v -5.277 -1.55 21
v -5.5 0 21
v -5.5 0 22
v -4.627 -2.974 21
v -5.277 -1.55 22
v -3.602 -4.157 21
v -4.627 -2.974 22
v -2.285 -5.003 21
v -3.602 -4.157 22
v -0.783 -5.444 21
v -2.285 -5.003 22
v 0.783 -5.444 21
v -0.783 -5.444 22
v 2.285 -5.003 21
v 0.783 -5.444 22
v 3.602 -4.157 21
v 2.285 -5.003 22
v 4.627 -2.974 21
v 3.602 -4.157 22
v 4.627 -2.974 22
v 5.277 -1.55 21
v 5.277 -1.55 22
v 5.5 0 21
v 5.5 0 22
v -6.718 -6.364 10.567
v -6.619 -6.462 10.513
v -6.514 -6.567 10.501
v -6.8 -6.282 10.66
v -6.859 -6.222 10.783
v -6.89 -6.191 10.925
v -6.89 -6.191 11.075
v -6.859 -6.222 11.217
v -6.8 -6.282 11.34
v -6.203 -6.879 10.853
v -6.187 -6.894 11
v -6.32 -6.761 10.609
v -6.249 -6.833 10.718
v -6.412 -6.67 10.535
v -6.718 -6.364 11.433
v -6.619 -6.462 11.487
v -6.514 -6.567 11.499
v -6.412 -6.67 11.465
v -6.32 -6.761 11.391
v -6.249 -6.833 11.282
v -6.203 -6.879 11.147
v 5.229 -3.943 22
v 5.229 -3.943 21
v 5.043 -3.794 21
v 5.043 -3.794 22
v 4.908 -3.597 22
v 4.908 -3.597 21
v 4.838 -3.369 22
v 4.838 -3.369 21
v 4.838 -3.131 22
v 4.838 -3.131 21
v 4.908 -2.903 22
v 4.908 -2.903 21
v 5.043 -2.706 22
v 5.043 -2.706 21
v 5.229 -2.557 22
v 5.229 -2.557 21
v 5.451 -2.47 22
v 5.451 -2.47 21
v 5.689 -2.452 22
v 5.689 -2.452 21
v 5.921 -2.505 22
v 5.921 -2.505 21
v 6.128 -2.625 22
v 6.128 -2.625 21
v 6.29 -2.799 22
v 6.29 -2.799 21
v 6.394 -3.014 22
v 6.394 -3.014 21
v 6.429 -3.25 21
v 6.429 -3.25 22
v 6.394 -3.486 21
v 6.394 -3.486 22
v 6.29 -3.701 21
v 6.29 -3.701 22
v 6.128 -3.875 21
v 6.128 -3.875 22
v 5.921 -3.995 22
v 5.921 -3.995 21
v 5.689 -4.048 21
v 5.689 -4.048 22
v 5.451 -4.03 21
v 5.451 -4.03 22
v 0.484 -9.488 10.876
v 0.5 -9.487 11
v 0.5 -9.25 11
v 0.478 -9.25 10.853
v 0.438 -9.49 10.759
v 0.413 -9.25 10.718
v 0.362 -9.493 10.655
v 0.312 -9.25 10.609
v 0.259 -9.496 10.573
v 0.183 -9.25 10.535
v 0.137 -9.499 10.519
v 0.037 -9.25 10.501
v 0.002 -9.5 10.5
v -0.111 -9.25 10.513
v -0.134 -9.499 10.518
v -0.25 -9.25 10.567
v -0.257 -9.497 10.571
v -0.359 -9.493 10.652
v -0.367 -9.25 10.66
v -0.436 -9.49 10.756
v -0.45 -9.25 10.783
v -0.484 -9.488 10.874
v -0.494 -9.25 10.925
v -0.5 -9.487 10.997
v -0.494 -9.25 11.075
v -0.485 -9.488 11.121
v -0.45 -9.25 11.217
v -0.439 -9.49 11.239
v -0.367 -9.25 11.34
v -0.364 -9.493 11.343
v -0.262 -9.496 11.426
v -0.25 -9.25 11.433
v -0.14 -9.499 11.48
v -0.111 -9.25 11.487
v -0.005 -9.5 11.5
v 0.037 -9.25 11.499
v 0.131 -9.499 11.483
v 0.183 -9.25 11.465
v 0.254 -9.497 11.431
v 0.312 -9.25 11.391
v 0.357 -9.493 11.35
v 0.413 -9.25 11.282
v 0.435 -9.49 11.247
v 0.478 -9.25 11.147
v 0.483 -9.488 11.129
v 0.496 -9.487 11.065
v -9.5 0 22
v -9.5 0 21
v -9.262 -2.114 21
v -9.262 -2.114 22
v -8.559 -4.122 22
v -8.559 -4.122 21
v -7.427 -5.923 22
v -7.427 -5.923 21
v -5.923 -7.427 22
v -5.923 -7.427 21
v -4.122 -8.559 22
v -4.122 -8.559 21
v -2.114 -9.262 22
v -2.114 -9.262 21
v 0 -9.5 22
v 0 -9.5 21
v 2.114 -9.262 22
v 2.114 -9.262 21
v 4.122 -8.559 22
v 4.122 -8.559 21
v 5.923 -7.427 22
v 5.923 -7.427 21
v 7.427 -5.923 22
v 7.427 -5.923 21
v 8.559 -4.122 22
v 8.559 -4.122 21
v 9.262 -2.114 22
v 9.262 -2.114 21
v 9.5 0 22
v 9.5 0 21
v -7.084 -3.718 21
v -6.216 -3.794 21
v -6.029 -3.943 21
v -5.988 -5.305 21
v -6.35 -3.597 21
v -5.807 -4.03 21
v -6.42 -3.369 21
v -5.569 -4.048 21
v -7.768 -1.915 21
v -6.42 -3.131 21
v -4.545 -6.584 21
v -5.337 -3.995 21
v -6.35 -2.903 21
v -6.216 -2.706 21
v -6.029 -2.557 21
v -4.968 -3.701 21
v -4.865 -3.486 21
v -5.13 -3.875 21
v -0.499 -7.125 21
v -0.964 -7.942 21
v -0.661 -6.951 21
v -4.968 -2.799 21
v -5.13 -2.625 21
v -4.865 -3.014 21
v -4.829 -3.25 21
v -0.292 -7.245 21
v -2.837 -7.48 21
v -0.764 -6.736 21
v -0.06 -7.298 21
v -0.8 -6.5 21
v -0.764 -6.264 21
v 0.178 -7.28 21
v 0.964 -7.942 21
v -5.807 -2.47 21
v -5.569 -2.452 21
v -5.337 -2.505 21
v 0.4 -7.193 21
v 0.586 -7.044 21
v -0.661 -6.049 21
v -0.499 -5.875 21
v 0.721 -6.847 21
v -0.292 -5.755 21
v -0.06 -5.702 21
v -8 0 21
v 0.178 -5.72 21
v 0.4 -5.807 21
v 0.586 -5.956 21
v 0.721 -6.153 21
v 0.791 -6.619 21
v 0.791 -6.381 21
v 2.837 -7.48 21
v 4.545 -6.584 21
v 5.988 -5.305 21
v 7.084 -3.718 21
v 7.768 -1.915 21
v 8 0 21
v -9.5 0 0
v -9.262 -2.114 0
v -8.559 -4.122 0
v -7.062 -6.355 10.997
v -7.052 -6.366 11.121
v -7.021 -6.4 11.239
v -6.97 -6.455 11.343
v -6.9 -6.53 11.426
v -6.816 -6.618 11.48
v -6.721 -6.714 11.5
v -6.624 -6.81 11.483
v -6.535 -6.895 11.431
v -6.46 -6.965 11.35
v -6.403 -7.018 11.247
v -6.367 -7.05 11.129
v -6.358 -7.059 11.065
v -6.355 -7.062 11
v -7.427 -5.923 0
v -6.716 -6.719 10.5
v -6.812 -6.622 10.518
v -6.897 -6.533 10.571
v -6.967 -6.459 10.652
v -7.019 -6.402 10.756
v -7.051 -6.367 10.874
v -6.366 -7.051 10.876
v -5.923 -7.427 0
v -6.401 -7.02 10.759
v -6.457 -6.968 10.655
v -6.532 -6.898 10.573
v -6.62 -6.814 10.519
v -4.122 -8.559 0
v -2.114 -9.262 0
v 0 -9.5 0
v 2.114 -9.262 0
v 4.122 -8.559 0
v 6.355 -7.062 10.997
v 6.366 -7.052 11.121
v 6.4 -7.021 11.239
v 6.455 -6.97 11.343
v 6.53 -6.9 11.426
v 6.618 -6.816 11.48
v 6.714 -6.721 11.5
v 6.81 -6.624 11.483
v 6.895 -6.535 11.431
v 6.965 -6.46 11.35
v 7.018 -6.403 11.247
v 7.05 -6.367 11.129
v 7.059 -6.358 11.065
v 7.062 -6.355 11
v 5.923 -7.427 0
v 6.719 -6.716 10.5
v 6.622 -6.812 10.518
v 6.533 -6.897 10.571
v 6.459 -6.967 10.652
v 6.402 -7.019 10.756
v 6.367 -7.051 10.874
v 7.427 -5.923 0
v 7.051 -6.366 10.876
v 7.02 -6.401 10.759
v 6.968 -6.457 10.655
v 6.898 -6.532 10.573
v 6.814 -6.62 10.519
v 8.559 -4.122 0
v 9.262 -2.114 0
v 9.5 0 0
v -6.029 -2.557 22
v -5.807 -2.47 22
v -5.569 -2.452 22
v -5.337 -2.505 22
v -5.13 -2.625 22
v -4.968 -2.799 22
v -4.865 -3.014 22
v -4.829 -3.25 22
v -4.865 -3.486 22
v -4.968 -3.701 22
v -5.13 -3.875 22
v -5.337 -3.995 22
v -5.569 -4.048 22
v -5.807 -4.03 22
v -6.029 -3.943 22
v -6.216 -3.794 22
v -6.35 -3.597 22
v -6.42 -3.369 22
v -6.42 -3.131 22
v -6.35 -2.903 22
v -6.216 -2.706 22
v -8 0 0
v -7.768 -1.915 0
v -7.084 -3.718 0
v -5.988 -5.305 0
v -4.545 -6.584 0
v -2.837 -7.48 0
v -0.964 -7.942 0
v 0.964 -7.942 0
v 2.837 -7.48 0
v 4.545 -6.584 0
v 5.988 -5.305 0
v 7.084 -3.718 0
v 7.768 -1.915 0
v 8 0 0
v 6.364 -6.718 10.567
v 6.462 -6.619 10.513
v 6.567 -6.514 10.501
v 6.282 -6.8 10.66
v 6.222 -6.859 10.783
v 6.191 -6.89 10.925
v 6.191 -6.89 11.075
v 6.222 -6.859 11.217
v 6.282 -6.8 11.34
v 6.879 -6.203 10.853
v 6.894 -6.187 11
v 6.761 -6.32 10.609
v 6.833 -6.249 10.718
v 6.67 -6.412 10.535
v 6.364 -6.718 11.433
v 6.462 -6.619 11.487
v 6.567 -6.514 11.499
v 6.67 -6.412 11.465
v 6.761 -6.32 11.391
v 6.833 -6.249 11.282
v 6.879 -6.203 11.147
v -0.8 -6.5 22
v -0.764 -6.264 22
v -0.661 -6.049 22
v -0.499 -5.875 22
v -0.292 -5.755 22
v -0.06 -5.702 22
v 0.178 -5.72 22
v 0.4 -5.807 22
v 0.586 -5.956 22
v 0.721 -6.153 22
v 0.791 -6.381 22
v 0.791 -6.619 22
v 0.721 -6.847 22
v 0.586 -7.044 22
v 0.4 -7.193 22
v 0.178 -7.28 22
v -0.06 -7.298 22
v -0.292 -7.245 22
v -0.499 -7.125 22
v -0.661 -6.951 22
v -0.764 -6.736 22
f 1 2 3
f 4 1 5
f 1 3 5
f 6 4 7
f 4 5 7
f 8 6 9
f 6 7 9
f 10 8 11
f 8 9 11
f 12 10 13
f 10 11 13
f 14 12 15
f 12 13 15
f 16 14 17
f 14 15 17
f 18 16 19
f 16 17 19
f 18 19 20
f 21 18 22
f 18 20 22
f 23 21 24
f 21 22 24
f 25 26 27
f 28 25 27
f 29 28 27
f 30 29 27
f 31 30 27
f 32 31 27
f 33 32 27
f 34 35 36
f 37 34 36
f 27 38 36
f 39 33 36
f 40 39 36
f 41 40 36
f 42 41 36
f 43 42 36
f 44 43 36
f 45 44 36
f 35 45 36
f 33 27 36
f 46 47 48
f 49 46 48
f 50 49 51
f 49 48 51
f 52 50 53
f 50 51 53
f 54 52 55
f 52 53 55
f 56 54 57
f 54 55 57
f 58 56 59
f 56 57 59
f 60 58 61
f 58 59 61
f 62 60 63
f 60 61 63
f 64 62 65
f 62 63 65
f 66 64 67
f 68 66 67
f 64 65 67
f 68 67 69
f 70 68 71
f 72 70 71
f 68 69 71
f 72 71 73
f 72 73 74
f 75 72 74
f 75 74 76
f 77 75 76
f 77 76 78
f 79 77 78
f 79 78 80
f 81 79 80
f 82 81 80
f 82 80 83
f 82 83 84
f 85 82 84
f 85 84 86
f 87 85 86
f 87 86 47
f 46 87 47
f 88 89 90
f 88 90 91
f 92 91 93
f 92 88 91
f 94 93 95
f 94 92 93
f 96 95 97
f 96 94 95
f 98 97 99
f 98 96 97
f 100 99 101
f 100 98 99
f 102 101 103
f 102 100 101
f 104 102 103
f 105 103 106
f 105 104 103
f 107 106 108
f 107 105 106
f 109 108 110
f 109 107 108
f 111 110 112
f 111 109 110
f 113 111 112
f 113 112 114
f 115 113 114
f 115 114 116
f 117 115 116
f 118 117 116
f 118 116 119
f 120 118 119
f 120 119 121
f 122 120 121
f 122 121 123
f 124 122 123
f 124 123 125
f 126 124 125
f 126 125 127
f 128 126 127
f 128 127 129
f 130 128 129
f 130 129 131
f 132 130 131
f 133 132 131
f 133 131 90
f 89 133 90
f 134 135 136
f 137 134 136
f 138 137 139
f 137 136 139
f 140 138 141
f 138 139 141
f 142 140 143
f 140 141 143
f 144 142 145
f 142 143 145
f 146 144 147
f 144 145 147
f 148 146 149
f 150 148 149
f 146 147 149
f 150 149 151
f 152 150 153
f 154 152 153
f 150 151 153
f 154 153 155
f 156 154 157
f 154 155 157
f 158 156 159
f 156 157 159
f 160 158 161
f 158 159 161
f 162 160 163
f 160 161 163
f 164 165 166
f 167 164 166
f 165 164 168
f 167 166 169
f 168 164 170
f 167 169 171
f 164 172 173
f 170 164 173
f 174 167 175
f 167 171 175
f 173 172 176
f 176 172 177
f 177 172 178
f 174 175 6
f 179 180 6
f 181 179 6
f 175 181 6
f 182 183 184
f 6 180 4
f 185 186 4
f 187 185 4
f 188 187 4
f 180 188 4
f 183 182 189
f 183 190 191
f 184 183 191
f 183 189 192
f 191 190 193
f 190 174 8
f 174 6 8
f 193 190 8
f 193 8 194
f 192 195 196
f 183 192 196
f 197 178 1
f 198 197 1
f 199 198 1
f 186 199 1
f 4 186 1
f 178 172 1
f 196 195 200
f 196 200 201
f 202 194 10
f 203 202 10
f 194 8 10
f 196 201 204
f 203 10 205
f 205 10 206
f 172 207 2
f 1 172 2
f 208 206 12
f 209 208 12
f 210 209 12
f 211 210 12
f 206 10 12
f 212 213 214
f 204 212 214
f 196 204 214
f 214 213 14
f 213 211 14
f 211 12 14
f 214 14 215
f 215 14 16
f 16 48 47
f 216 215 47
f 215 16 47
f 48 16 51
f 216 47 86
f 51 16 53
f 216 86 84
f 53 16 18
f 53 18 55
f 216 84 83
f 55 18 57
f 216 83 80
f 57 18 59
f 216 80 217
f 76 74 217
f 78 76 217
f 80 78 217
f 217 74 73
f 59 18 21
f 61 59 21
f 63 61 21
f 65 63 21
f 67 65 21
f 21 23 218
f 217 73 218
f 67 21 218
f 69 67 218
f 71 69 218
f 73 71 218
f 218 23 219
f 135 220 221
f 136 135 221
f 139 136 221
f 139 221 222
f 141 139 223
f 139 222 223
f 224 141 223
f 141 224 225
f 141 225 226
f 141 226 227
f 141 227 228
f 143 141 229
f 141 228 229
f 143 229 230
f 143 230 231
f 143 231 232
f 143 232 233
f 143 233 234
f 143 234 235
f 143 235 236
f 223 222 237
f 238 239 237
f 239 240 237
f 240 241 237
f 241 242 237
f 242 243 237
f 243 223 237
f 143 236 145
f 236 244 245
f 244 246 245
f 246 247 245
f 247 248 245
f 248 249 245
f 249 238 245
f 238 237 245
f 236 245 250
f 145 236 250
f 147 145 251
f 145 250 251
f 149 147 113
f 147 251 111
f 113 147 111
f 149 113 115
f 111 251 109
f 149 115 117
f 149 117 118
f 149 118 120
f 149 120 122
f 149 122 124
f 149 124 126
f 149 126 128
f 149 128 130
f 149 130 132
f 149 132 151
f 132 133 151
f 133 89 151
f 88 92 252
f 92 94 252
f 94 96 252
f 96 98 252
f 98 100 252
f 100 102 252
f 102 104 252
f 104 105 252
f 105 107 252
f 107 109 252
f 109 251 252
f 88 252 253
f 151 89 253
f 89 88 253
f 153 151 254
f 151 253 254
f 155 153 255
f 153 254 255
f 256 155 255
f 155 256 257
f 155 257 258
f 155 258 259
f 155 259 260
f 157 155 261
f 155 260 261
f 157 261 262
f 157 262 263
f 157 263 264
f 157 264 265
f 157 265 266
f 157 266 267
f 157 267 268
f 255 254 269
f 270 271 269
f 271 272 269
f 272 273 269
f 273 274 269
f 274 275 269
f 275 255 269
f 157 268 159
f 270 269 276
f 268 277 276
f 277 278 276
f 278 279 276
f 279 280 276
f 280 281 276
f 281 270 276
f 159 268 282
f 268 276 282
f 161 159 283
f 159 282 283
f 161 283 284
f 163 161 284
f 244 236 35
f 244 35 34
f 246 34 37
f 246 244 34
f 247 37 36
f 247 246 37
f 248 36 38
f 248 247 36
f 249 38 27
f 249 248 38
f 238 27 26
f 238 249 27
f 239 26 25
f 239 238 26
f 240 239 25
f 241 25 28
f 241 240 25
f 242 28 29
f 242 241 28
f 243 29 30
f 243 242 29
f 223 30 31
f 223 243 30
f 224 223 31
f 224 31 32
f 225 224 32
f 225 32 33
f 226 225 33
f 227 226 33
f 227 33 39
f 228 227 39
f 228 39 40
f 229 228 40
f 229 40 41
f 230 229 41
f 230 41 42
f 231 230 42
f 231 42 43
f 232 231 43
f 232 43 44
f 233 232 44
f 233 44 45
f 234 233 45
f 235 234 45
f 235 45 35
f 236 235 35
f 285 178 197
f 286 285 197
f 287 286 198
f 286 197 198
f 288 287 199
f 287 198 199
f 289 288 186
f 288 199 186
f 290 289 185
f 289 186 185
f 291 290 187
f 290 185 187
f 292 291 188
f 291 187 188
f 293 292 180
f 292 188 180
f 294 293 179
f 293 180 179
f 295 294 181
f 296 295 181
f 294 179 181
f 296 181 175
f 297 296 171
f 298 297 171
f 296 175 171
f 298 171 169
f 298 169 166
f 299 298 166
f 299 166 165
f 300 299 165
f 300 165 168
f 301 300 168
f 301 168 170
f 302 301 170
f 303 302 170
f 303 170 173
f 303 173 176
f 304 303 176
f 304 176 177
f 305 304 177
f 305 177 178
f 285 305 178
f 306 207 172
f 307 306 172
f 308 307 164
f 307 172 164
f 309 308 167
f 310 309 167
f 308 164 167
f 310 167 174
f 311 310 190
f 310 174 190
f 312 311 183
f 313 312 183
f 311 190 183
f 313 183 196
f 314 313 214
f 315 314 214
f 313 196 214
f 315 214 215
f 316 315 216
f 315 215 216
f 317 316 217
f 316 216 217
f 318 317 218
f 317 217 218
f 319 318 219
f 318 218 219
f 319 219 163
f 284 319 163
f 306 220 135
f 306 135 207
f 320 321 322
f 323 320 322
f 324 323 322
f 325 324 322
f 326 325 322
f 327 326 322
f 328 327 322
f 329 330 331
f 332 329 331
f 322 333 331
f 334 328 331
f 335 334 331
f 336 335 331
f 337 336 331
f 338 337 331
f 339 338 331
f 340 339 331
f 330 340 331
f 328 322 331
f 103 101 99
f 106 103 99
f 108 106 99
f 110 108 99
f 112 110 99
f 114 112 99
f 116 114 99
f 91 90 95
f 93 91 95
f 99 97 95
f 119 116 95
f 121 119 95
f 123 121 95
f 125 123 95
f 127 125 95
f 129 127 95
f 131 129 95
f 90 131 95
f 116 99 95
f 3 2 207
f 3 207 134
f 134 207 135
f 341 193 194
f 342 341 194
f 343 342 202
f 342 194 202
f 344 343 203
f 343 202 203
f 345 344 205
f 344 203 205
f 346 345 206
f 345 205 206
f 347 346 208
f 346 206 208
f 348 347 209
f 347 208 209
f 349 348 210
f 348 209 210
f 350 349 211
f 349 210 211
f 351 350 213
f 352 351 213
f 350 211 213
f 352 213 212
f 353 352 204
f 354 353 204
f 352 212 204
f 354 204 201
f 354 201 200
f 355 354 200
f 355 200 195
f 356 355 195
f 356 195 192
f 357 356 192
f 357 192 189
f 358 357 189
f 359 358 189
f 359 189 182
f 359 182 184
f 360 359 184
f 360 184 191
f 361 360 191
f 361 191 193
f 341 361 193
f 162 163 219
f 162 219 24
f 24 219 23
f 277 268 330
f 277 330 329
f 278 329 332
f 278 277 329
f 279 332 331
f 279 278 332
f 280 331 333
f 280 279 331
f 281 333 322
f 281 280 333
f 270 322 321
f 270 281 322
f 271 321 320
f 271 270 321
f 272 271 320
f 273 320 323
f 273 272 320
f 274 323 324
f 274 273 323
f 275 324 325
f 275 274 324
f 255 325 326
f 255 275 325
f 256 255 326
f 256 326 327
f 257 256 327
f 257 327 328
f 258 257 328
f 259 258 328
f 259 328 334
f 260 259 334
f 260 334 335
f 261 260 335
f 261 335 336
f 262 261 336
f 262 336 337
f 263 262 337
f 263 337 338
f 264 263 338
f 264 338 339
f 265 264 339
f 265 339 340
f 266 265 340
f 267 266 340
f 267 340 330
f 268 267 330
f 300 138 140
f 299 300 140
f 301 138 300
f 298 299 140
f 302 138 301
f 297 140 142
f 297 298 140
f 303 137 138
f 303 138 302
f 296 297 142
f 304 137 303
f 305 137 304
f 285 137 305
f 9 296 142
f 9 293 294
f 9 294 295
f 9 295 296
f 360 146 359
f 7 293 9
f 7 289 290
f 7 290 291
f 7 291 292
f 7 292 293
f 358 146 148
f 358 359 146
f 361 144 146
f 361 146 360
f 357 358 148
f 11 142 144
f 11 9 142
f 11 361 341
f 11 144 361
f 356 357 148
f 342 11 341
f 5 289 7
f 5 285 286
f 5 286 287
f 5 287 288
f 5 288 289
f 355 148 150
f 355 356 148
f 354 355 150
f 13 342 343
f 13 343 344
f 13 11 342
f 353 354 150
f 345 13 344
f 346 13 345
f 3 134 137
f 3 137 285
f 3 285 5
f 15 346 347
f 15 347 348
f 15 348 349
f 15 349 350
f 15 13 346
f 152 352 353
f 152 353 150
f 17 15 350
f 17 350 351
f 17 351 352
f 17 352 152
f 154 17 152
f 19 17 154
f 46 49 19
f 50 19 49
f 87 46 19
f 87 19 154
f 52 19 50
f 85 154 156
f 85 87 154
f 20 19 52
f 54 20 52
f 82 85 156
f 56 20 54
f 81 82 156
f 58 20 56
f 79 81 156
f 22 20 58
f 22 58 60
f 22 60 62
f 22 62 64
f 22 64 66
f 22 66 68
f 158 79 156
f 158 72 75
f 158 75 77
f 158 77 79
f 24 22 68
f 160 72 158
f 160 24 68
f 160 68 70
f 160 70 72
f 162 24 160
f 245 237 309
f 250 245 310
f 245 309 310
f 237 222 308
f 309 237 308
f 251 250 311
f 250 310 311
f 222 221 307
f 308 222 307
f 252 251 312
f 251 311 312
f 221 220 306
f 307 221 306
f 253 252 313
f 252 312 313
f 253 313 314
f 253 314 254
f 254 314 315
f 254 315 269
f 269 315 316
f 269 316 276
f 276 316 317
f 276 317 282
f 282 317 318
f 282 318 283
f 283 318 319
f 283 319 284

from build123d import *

# Parameters (mm, degrees)
SKETCH1_R                       = 9.5
BOSS_EXTRUDE1_DEPTH             = 21
SKETCH2_R                       = 8
CUT_EXTRUDE1_DEPTH              = 22
SKETCH4_W                       = 19
SKETCH4_H                       = 9.5
CUT_EXTRUDE2_DEPTH              = 22
BOSS_EXTRUDE3_DEPTH             = 1
SKETCH7_R                       = 0.5
CUT_EXTRUDE8_DEPTH              = 0.5
CIRPATTERN1_COUNT               = 2
CIRPATTERN1_ANGLE               = 45
CIRPATTERN1_THE_OTHER_WAY_COUNT = 2
CIRPATTERN1_THE_OTHER_WAY_ANGLE = 45
SKETCH8_R                       = 5.5
CUT_EXTRUDE9_DEPTH              = 23.0000001
SKETCH9_R                       = 0.8
CUT_EXTRUDE10_DEPTH             = 2.0000001
CIRPATTERN2_COUNT               = 6


with BuildPart() as part:
    # Sketch1 → Boss-Extrude1 (new body)
    with BuildSketch(Plane.XY):
        Circle(SKETCH1_R)
    extrude(amount=BOSS_EXTRUDE1_DEPTH)

    # Sketch2 → Cut-Extrude1 (cut, through all)
    with BuildSketch(Plane.XY.offset(21)):
        Circle(SKETCH2_R)
    extrude(amount=-CUT_EXTRUDE1_DEPTH, mode=Mode.SUBTRACT)

    # Sketch4 → Cut-Extrude2 (cut, through all)
    with BuildSketch(Plane.XY.offset(21)):
        with Locations((0, 4.75)):
            Rectangle(SKETCH4_W, SKETCH4_H)
    extrude(amount=-CUT_EXTRUDE2_DEPTH, mode=Mode.SUBTRACT)

    # Sketch5 → Boss-Extrude3 (add)
    with BuildSketch(Plane.XY.offset(21)):
        with BuildLine():
            ThreePointArc((8, 0), (0, -8), (-8, 0))
            Line((-8, 0), (-9.5, 0))
            ThreePointArc((-9.5, 0), (0, -9.5), (9.5, 0))
            Line((9.5, 0), (8, 0))
        make_face()
        with BuildLine():
            Line((8, 0), (-8, 0))
            ThreePointArc((-8, 0), (0, -8), (8, 0))
        make_face()
    extrude(amount=BOSS_EXTRUDE3_DEPTH)

    # Sketch7 → Cut-Extrude8 (cut)
    with BuildSketch(Plane(origin=(0, -9.75, 0), x_dir=(1, 0, 0), z_dir=(0, 1, 0))):
        with Locations((0, -11)):
            Circle(SKETCH7_R)
        with Locations((0, 4)):
            Circle(SKETCH7_R)
        with Locations((0, -26)):
            Circle(SKETCH7_R)
    cut_extrude8 = extrude(amount=CUT_EXTRUDE8_DEPTH, mode=Mode.SUBTRACT)

    # CirPattern1: Cut-Extrude8 ×2 about axis
    cirpattern1_axis = Axis((0, 0, 0), (0, 0, -1))
    for i in range(1, CIRPATTERN1_COUNT):
        add(cut_extrude8.rotate(cirpattern1_axis, i * CIRPATTERN1_ANGLE / (CIRPATTERN1_COUNT - 1)), mode=Mode.SUBTRACT)

    # CirPattern1 the other way: Cut-Extrude8 ×2 about axis
    cirpattern1_the_other_way_axis = Axis((0, 0, 0), (0, 0, 1))
    for i in range(1, CIRPATTERN1_THE_OTHER_WAY_COUNT):
        add(cut_extrude8.rotate(cirpattern1_the_other_way_axis, i * CIRPATTERN1_THE_OTHER_WAY_ANGLE / (CIRPATTERN1_THE_OTHER_WAY_COUNT - 1)), mode=Mode.SUBTRACT)

    # Sketch8 → Cut-Extrude9 (cut, through all)
    with BuildSketch(Plane.XY.offset(22)):
        Circle(SKETCH8_R)
    extrude(amount=-CUT_EXTRUDE9_DEPTH, mode=Mode.SUBTRACT)

    # Sketch9 → Cut-Extrude10 (cut, through all)
    with BuildSketch(Plane(origin=(0, 0, 21), x_dir=(-1, 0, 0), z_dir=(0, 0, -1))):
        with Locations((0, -6.5)):
            Circle(SKETCH9_R)
    cut_extrude10 = extrude(amount=-CUT_EXTRUDE10_DEPTH, mode=Mode.SUBTRACT)

    # CirPattern2: Cut-Extrude10 ×6 about axis
    cirpattern2_axis = Axis((0, 0, 0), (0, 0, 1))
    for i in range(1, CIRPATTERN2_COUNT):
        add(cut_extrude10.rotate(cirpattern2_axis, i * 360 / CIRPATTERN2_COUNT), mode=Mode.SUBTRACT)


solid = part.part
